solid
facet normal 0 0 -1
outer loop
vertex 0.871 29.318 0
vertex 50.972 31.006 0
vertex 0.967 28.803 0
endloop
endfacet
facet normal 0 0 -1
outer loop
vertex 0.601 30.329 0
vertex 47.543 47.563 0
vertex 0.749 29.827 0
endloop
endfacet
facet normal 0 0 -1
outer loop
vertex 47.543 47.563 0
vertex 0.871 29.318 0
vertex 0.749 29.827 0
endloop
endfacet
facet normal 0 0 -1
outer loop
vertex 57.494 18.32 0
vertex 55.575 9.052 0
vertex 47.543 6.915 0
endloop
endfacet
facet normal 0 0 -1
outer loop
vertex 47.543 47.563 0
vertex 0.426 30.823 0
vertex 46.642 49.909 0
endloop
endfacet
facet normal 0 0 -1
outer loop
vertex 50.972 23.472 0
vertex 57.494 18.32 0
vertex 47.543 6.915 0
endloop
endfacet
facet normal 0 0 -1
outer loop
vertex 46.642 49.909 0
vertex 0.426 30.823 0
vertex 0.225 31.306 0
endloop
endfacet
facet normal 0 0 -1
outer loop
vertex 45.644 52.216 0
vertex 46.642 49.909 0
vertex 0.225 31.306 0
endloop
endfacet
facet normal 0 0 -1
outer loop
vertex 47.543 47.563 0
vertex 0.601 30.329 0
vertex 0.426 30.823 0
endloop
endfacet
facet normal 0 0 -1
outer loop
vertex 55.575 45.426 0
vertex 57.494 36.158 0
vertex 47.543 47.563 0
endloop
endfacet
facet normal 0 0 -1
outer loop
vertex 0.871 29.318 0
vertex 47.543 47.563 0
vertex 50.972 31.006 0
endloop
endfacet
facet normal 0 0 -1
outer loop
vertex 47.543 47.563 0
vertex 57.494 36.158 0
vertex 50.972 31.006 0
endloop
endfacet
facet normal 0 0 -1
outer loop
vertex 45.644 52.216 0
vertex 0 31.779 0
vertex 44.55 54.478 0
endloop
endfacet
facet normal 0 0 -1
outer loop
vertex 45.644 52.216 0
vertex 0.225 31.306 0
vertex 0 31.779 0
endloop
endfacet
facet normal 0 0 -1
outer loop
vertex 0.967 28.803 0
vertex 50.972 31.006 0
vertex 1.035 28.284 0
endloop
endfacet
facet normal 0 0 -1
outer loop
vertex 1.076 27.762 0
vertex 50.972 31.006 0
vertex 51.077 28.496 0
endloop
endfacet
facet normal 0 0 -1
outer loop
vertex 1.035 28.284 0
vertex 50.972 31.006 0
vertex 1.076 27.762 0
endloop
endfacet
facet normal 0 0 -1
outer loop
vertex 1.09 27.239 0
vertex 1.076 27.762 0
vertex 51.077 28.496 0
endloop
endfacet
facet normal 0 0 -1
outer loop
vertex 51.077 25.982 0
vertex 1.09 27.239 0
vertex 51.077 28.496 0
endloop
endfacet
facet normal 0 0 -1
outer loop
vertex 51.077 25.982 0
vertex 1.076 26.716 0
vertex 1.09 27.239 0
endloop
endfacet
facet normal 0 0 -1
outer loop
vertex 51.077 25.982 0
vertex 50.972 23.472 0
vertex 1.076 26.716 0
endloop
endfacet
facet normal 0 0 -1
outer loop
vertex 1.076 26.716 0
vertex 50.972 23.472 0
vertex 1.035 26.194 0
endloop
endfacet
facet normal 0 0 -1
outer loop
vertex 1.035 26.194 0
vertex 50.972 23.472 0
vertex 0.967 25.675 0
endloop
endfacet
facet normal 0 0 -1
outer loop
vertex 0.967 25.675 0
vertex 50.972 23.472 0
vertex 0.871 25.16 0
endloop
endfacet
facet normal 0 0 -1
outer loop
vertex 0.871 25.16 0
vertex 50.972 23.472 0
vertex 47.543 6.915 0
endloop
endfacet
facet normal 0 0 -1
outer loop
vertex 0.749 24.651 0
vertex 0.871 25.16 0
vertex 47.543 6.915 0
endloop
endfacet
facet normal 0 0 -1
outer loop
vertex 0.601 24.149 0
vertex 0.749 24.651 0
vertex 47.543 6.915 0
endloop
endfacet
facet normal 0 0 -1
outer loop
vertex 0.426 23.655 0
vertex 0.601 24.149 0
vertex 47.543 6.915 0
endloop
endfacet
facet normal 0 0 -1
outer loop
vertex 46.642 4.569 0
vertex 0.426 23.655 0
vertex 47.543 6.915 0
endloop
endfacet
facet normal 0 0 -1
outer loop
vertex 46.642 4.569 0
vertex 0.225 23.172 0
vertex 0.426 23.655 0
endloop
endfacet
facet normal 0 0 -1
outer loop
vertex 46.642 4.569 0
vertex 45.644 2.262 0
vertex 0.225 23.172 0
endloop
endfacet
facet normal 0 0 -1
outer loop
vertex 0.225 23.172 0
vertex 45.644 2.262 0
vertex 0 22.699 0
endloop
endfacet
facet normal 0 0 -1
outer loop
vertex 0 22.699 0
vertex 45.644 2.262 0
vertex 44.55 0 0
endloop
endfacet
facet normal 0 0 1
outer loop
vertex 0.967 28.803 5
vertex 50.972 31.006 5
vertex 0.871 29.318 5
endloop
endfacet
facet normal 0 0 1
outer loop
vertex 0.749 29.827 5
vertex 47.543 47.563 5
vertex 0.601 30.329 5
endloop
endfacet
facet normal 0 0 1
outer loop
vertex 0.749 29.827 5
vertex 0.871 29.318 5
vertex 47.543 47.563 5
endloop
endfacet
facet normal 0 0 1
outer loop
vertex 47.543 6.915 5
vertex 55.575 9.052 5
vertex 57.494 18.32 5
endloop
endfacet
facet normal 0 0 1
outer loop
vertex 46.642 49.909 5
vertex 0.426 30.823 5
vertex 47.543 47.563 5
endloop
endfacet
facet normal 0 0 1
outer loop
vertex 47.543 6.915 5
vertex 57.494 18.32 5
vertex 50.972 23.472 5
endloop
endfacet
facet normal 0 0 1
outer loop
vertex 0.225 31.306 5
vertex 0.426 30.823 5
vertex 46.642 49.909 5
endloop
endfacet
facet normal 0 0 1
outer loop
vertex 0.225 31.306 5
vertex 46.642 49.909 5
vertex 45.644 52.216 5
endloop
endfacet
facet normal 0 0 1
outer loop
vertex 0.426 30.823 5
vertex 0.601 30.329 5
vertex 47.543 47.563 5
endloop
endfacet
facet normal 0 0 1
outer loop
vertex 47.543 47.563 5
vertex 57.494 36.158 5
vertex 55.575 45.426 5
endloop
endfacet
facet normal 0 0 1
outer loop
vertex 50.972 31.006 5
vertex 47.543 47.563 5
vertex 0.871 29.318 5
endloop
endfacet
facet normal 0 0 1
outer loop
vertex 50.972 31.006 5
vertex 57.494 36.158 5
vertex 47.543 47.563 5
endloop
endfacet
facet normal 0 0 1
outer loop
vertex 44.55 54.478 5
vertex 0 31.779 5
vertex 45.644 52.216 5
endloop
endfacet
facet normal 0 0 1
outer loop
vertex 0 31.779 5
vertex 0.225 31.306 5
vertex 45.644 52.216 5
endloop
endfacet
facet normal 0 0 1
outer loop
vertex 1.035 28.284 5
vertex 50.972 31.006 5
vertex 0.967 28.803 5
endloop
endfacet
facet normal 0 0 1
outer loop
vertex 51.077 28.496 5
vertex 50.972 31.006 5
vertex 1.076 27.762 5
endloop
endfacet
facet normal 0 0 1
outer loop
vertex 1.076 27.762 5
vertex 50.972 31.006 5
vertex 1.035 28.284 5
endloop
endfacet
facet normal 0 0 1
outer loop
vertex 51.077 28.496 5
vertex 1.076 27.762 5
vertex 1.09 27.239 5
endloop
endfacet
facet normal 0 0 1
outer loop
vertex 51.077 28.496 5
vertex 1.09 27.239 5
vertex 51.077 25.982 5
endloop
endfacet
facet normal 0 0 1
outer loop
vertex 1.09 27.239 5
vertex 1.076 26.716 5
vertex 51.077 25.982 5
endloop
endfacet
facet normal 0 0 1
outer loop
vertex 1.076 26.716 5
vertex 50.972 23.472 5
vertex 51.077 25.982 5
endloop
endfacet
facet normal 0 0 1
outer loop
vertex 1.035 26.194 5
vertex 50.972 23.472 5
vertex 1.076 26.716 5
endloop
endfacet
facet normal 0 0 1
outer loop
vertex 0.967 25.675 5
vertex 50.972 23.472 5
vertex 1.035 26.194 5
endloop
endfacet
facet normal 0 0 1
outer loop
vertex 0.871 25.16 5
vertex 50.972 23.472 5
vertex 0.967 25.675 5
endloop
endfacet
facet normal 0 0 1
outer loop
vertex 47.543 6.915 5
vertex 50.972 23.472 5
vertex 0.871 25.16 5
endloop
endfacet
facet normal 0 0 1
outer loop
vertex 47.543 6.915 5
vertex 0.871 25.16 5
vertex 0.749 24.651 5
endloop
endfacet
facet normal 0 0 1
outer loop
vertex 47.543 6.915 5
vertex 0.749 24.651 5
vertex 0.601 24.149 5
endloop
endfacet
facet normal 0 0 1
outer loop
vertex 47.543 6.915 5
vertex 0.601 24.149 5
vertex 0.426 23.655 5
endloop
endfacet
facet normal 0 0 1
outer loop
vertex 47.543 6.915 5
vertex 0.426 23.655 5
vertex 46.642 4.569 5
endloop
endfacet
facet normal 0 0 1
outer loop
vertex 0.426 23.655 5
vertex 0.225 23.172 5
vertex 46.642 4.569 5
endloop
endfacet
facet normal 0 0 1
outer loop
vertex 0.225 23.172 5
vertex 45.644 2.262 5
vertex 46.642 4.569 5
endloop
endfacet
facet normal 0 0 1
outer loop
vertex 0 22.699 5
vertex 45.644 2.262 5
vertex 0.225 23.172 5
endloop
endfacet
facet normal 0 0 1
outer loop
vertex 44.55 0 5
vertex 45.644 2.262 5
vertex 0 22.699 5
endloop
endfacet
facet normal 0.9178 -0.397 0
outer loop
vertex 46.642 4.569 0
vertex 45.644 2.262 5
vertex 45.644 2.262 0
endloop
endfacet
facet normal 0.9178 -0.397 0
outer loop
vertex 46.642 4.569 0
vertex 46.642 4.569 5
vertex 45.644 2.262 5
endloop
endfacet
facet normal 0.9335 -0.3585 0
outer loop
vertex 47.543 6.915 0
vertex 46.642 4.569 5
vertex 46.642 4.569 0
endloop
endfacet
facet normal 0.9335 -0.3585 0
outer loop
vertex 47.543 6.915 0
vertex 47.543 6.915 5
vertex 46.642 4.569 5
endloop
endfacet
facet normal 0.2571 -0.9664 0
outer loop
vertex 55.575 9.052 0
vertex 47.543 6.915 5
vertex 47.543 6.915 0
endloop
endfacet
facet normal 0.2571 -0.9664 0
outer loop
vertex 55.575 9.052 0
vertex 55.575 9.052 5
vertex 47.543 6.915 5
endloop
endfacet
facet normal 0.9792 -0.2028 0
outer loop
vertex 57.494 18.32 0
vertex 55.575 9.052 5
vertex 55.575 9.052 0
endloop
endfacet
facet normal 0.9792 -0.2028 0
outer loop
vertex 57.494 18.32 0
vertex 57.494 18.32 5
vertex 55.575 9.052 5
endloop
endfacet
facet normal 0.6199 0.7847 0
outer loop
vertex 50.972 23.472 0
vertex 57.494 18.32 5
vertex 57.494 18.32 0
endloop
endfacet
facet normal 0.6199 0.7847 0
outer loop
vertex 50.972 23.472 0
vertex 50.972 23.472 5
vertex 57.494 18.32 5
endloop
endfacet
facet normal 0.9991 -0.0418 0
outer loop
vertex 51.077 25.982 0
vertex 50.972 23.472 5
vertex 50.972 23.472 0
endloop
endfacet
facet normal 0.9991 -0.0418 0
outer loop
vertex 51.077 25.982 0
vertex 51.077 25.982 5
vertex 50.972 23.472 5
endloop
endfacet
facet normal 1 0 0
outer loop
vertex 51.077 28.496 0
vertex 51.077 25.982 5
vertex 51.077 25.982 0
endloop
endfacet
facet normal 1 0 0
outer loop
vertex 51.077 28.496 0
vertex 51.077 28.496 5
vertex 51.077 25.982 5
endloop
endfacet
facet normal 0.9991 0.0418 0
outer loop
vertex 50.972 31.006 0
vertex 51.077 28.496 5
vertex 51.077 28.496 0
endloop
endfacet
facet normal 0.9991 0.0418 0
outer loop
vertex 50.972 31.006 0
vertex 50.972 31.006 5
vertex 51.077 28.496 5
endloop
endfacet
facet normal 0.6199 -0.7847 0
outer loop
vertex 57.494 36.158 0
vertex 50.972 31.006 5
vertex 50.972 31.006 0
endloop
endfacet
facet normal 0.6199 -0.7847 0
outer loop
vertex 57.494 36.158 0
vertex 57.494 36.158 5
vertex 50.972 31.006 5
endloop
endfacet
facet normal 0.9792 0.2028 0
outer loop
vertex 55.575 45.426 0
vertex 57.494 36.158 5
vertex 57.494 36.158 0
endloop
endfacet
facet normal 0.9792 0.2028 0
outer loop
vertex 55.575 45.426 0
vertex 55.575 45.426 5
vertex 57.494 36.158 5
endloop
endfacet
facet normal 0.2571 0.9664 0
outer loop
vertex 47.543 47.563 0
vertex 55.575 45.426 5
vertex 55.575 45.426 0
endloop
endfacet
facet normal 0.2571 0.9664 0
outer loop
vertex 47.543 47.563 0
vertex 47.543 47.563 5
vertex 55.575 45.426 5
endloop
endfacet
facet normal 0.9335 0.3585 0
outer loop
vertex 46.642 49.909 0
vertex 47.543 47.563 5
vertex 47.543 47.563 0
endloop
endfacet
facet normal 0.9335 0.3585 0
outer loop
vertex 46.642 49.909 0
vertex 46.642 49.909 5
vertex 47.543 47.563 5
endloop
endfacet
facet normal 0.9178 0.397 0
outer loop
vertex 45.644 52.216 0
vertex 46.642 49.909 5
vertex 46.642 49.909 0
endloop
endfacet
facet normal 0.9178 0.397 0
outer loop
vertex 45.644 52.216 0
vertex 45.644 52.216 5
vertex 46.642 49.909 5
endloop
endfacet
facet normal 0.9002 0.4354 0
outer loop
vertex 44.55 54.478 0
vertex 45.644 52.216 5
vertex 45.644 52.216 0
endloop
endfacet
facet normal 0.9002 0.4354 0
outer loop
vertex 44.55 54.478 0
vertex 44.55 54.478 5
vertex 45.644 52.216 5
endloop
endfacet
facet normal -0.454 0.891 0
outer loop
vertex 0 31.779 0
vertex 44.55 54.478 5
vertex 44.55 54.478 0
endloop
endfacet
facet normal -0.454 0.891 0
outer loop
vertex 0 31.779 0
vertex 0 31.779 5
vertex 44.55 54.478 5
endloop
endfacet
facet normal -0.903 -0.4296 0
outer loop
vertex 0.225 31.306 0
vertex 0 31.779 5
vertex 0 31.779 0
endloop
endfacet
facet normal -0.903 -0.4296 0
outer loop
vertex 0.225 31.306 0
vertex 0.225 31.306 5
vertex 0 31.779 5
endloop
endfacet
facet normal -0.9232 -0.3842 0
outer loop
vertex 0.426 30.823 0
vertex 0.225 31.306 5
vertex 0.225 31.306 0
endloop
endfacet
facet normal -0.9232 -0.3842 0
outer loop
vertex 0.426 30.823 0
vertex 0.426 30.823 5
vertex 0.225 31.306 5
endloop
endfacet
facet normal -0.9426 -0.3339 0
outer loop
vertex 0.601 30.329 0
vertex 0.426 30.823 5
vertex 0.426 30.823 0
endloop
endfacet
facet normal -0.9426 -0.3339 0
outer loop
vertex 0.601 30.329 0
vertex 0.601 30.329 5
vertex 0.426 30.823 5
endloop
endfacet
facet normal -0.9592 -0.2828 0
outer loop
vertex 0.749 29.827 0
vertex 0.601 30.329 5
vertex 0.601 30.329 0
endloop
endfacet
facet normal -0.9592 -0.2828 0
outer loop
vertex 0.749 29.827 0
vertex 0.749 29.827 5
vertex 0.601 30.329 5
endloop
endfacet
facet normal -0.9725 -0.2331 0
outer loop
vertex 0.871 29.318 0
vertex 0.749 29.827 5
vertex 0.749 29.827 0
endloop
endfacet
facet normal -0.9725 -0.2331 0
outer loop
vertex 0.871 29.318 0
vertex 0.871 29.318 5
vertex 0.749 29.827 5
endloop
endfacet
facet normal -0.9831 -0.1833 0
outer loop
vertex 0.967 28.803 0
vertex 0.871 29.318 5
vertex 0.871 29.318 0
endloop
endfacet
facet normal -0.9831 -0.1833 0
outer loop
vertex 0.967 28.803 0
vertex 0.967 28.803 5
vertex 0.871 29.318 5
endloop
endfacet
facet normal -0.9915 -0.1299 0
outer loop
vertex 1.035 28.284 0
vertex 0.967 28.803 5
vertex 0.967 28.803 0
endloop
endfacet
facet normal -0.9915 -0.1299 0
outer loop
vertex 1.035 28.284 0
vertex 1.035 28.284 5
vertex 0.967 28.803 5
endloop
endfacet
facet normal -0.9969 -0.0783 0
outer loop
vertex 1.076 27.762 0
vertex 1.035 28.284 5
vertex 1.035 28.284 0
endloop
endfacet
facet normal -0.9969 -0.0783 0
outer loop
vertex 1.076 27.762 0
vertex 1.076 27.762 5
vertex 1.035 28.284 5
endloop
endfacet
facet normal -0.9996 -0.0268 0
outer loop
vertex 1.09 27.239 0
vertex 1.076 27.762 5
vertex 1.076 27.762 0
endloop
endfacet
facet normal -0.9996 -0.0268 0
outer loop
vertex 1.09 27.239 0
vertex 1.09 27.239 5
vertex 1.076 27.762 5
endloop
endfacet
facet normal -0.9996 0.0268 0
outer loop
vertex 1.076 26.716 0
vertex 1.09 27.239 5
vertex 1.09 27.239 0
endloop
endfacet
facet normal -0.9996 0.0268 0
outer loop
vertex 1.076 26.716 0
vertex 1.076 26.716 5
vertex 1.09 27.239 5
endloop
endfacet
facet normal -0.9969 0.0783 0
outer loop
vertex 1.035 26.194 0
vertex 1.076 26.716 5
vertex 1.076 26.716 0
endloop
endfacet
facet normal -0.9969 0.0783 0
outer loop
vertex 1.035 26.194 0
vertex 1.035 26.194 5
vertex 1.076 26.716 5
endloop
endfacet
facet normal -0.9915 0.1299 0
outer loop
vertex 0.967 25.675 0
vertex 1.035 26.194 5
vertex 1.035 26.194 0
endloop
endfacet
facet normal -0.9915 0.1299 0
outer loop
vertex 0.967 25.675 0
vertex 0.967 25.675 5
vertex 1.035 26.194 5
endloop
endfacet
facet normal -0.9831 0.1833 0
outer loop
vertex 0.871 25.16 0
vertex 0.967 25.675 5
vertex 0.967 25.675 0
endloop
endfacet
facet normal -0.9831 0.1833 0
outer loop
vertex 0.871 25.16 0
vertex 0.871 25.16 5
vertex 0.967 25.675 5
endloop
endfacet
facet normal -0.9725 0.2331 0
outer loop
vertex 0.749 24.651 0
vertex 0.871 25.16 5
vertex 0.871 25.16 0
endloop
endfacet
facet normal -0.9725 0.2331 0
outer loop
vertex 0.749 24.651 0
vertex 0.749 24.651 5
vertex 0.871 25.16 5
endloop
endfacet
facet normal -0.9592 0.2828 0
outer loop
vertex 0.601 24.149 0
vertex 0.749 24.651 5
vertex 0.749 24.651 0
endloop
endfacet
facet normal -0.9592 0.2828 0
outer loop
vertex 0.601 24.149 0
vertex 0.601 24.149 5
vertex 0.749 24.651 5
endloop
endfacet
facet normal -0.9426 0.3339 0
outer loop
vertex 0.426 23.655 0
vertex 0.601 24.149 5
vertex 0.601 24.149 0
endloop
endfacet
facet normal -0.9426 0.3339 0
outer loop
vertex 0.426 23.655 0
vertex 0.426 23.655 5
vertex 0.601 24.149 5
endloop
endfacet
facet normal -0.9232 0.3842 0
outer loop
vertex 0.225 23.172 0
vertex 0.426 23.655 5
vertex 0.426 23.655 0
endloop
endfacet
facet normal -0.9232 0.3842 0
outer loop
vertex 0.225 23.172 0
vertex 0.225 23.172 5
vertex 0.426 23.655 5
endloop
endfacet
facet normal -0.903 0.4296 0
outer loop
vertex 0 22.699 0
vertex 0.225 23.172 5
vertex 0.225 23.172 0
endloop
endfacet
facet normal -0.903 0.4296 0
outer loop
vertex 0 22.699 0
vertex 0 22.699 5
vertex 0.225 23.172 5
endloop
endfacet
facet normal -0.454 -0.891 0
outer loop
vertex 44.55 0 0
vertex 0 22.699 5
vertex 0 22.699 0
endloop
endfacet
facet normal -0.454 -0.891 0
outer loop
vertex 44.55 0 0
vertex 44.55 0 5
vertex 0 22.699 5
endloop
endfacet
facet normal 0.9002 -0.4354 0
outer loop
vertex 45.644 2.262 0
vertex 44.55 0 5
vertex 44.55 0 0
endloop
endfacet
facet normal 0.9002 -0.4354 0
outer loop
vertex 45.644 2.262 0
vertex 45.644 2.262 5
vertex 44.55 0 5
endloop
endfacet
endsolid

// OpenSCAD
$fn = 32;

// ----------------------------------------------------------------------
// Gear sector: 2 teeth on 54 degrees
// ----------------------------------------------------------------------

// --- parameters (mm) ---
sector_angle = 54;        // sector angle, degrees
root_r = 60;              // root circle radius
tooth_h = 7;              // tooth height over the root circle
teeth = 2;                // number of teeth on the sector
hub_r = 10;               // hub bore radius
plate_t = 5;              // sector thickness, Z
arc_step = 3;             // sampling step of the root/hub arcs, degrees

tip_r = root_r + tooth_h;  // tip circle radius

profile = [[44.55, 0], [45.644, 2.262], [46.642, 4.569], [47.543, 6.915], [55.575, 9.052], [57.494, 18.32], [50.972, 23.472], [51.077, 25.982], [51.077, 28.496], [50.972, 31.006], [57.494, 36.158], [55.575, 45.426], [47.543, 47.563], [46.642, 49.909], [45.644, 52.216], [44.55, 54.478], [0, 31.779], [0.225, 31.306], [0.426, 30.823], [0.601, 30.329], [0.749, 29.827], [0.871, 29.318], [0.967, 28.803], [1.035, 28.284], [1.076, 27.762], [1.09, 27.239], [1.076, 26.716], [1.035, 26.194], [0.967, 25.675], [0.871, 25.16], [0.749, 24.651], [0.601, 24.149], [0.426, 23.655], [0.225, 23.172], [0, 22.699]];  // primary outline, 35 points, counter clockwise

// --- the one profile operation ---
linear_extrude(height = plate_t) polygon(points = profile);
